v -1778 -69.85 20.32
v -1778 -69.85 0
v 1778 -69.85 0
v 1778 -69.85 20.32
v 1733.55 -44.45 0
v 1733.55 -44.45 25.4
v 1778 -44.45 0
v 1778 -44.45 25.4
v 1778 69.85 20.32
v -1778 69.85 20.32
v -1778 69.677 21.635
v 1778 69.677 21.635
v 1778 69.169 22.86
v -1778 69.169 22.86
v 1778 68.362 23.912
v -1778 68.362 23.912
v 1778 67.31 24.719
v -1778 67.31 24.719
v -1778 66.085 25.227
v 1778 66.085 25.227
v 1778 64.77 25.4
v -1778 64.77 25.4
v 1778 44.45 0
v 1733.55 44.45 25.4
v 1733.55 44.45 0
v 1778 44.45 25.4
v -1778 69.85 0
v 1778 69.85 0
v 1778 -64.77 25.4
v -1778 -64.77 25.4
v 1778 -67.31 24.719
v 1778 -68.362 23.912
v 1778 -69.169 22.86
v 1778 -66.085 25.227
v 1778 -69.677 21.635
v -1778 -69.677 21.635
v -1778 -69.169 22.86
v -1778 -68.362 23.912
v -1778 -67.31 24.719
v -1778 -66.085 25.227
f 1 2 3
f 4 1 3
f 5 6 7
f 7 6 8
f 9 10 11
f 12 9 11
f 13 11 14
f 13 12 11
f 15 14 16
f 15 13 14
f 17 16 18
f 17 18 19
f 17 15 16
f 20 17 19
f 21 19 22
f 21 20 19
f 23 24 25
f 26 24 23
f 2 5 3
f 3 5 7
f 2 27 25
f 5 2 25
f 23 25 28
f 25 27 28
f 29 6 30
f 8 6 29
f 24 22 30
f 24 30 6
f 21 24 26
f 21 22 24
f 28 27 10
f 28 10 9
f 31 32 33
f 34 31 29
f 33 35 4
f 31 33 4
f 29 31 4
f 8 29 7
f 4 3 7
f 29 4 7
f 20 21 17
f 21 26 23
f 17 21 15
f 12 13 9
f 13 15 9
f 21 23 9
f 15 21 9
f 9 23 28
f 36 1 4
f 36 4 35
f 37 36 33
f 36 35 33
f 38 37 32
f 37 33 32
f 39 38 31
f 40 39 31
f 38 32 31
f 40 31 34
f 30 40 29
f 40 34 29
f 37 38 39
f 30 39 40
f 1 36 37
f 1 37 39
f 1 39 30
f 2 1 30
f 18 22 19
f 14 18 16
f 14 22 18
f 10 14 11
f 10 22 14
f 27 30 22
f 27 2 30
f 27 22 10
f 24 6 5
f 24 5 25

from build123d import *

# Parameters (mm, degrees)
F0_W     = 3556
F0_H     = 139.7
F1_DEPTH = 25.4
F2_W     = 44.45
F2_H     = 88.9
F3_DEPTH = 25.401
F4_R     = 5.08


with BuildPart() as f1:
    # F0 (on Top) → F1 (new body)
    with BuildSketch(Plane.XY):
        Rectangle(F0_W, F0_H)
    extrude(amount=F1_DEPTH)

    # F2 (on face) → F3 (cut, through all)
    with BuildSketch(Plane.XY.offset(25.4)):
        with Locations((1755.775, 0)):
            Rectangle(F2_W, F2_H)
    extrude(amount=-F3_DEPTH, mode=Mode.SUBTRACT)

    # F4
    f4_edges = [f1.edges().sort_by_distance(p)[0] for p in [
        (0, -69.85, 25.4),
        (0, 69.85, 25.4),
    ]]
    fillet(f4_edges, radius=F4_R)


solid = f1.part
